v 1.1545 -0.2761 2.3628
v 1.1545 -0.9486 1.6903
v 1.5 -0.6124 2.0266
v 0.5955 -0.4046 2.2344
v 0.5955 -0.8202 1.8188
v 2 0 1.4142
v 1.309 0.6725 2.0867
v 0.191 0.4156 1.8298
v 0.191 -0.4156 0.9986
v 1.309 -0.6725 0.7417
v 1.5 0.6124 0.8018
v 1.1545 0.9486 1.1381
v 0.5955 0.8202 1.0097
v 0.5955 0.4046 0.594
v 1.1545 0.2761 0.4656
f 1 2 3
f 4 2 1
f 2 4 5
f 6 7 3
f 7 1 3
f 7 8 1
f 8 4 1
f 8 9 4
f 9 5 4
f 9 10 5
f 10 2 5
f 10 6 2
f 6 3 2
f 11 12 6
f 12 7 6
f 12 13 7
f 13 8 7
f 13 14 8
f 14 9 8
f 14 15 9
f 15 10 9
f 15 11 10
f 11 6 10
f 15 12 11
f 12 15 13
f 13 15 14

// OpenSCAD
$fn=5;
translate([1,-0.00000011920929,1.4142135])
{
	rotate(45.000004,[1,0,0])
	{
		sphere(d=2);
	}
}
